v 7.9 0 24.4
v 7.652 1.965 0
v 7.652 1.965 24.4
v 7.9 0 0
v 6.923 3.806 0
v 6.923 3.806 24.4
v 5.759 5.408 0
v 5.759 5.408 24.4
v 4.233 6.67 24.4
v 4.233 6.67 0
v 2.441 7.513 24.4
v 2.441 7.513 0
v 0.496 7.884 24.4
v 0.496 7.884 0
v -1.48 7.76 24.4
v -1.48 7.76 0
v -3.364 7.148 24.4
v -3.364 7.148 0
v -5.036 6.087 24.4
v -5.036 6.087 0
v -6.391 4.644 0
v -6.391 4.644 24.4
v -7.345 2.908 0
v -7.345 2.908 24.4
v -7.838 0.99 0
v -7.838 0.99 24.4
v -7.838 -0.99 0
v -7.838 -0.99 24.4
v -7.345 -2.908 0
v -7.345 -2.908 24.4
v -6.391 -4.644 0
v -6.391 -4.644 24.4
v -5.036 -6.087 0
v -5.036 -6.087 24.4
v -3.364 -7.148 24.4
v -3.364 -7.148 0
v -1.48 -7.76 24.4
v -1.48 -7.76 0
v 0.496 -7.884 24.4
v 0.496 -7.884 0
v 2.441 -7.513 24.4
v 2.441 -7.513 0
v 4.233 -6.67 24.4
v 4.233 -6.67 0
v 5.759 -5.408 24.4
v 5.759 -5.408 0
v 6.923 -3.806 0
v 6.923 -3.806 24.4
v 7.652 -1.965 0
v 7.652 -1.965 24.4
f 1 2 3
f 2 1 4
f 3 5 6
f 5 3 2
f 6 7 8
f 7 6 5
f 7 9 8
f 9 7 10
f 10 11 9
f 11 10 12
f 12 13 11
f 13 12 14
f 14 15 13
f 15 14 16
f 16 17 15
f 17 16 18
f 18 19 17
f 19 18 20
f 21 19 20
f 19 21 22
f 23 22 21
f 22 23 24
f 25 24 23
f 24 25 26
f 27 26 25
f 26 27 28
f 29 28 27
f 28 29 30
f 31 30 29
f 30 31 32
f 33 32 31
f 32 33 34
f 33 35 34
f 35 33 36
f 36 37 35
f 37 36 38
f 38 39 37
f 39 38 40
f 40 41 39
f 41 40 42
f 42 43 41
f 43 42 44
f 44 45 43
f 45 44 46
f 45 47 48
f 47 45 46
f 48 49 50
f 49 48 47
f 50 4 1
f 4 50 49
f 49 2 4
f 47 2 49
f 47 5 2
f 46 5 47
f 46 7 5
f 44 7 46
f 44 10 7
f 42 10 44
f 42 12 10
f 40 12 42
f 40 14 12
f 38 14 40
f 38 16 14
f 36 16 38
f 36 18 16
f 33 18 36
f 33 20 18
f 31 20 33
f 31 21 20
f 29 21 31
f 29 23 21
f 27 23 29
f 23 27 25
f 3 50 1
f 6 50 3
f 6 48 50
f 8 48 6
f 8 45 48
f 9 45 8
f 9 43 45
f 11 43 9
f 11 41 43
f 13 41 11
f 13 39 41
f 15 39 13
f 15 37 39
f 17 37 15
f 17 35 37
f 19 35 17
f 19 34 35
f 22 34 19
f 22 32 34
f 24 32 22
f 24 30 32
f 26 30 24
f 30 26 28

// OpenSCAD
function LM8UULinearBearingDiam(3dPrinterTolerance=.4) = 15+3dPrinterTolerance*2;
function LM8UULinearBearingInnerDiam(3dPrinterTolerance=.4) = 8.3+3dPrinterTolerance*2;
function LM8UULinearBearingHeight(3dPrinterTolerance=.4) = 24+3dPrinterTolerance;
function LM8UULinearBearingRidgeOffset(3dPrinterTolerance=.4)= 4.6+3dPrinterTolerance/2;

module LM8UUBearing(3dPrinterTolerance=.4)
{
cylinder(LM8UULinearBearingHeight(3dPrinterTolerance), LM8UULinearBearingDiam(3dPrinterTolerance)/2, LM8UULinearBearingDiam(3dPrinterTolerance)/2);
}


LM8UUBearing();
